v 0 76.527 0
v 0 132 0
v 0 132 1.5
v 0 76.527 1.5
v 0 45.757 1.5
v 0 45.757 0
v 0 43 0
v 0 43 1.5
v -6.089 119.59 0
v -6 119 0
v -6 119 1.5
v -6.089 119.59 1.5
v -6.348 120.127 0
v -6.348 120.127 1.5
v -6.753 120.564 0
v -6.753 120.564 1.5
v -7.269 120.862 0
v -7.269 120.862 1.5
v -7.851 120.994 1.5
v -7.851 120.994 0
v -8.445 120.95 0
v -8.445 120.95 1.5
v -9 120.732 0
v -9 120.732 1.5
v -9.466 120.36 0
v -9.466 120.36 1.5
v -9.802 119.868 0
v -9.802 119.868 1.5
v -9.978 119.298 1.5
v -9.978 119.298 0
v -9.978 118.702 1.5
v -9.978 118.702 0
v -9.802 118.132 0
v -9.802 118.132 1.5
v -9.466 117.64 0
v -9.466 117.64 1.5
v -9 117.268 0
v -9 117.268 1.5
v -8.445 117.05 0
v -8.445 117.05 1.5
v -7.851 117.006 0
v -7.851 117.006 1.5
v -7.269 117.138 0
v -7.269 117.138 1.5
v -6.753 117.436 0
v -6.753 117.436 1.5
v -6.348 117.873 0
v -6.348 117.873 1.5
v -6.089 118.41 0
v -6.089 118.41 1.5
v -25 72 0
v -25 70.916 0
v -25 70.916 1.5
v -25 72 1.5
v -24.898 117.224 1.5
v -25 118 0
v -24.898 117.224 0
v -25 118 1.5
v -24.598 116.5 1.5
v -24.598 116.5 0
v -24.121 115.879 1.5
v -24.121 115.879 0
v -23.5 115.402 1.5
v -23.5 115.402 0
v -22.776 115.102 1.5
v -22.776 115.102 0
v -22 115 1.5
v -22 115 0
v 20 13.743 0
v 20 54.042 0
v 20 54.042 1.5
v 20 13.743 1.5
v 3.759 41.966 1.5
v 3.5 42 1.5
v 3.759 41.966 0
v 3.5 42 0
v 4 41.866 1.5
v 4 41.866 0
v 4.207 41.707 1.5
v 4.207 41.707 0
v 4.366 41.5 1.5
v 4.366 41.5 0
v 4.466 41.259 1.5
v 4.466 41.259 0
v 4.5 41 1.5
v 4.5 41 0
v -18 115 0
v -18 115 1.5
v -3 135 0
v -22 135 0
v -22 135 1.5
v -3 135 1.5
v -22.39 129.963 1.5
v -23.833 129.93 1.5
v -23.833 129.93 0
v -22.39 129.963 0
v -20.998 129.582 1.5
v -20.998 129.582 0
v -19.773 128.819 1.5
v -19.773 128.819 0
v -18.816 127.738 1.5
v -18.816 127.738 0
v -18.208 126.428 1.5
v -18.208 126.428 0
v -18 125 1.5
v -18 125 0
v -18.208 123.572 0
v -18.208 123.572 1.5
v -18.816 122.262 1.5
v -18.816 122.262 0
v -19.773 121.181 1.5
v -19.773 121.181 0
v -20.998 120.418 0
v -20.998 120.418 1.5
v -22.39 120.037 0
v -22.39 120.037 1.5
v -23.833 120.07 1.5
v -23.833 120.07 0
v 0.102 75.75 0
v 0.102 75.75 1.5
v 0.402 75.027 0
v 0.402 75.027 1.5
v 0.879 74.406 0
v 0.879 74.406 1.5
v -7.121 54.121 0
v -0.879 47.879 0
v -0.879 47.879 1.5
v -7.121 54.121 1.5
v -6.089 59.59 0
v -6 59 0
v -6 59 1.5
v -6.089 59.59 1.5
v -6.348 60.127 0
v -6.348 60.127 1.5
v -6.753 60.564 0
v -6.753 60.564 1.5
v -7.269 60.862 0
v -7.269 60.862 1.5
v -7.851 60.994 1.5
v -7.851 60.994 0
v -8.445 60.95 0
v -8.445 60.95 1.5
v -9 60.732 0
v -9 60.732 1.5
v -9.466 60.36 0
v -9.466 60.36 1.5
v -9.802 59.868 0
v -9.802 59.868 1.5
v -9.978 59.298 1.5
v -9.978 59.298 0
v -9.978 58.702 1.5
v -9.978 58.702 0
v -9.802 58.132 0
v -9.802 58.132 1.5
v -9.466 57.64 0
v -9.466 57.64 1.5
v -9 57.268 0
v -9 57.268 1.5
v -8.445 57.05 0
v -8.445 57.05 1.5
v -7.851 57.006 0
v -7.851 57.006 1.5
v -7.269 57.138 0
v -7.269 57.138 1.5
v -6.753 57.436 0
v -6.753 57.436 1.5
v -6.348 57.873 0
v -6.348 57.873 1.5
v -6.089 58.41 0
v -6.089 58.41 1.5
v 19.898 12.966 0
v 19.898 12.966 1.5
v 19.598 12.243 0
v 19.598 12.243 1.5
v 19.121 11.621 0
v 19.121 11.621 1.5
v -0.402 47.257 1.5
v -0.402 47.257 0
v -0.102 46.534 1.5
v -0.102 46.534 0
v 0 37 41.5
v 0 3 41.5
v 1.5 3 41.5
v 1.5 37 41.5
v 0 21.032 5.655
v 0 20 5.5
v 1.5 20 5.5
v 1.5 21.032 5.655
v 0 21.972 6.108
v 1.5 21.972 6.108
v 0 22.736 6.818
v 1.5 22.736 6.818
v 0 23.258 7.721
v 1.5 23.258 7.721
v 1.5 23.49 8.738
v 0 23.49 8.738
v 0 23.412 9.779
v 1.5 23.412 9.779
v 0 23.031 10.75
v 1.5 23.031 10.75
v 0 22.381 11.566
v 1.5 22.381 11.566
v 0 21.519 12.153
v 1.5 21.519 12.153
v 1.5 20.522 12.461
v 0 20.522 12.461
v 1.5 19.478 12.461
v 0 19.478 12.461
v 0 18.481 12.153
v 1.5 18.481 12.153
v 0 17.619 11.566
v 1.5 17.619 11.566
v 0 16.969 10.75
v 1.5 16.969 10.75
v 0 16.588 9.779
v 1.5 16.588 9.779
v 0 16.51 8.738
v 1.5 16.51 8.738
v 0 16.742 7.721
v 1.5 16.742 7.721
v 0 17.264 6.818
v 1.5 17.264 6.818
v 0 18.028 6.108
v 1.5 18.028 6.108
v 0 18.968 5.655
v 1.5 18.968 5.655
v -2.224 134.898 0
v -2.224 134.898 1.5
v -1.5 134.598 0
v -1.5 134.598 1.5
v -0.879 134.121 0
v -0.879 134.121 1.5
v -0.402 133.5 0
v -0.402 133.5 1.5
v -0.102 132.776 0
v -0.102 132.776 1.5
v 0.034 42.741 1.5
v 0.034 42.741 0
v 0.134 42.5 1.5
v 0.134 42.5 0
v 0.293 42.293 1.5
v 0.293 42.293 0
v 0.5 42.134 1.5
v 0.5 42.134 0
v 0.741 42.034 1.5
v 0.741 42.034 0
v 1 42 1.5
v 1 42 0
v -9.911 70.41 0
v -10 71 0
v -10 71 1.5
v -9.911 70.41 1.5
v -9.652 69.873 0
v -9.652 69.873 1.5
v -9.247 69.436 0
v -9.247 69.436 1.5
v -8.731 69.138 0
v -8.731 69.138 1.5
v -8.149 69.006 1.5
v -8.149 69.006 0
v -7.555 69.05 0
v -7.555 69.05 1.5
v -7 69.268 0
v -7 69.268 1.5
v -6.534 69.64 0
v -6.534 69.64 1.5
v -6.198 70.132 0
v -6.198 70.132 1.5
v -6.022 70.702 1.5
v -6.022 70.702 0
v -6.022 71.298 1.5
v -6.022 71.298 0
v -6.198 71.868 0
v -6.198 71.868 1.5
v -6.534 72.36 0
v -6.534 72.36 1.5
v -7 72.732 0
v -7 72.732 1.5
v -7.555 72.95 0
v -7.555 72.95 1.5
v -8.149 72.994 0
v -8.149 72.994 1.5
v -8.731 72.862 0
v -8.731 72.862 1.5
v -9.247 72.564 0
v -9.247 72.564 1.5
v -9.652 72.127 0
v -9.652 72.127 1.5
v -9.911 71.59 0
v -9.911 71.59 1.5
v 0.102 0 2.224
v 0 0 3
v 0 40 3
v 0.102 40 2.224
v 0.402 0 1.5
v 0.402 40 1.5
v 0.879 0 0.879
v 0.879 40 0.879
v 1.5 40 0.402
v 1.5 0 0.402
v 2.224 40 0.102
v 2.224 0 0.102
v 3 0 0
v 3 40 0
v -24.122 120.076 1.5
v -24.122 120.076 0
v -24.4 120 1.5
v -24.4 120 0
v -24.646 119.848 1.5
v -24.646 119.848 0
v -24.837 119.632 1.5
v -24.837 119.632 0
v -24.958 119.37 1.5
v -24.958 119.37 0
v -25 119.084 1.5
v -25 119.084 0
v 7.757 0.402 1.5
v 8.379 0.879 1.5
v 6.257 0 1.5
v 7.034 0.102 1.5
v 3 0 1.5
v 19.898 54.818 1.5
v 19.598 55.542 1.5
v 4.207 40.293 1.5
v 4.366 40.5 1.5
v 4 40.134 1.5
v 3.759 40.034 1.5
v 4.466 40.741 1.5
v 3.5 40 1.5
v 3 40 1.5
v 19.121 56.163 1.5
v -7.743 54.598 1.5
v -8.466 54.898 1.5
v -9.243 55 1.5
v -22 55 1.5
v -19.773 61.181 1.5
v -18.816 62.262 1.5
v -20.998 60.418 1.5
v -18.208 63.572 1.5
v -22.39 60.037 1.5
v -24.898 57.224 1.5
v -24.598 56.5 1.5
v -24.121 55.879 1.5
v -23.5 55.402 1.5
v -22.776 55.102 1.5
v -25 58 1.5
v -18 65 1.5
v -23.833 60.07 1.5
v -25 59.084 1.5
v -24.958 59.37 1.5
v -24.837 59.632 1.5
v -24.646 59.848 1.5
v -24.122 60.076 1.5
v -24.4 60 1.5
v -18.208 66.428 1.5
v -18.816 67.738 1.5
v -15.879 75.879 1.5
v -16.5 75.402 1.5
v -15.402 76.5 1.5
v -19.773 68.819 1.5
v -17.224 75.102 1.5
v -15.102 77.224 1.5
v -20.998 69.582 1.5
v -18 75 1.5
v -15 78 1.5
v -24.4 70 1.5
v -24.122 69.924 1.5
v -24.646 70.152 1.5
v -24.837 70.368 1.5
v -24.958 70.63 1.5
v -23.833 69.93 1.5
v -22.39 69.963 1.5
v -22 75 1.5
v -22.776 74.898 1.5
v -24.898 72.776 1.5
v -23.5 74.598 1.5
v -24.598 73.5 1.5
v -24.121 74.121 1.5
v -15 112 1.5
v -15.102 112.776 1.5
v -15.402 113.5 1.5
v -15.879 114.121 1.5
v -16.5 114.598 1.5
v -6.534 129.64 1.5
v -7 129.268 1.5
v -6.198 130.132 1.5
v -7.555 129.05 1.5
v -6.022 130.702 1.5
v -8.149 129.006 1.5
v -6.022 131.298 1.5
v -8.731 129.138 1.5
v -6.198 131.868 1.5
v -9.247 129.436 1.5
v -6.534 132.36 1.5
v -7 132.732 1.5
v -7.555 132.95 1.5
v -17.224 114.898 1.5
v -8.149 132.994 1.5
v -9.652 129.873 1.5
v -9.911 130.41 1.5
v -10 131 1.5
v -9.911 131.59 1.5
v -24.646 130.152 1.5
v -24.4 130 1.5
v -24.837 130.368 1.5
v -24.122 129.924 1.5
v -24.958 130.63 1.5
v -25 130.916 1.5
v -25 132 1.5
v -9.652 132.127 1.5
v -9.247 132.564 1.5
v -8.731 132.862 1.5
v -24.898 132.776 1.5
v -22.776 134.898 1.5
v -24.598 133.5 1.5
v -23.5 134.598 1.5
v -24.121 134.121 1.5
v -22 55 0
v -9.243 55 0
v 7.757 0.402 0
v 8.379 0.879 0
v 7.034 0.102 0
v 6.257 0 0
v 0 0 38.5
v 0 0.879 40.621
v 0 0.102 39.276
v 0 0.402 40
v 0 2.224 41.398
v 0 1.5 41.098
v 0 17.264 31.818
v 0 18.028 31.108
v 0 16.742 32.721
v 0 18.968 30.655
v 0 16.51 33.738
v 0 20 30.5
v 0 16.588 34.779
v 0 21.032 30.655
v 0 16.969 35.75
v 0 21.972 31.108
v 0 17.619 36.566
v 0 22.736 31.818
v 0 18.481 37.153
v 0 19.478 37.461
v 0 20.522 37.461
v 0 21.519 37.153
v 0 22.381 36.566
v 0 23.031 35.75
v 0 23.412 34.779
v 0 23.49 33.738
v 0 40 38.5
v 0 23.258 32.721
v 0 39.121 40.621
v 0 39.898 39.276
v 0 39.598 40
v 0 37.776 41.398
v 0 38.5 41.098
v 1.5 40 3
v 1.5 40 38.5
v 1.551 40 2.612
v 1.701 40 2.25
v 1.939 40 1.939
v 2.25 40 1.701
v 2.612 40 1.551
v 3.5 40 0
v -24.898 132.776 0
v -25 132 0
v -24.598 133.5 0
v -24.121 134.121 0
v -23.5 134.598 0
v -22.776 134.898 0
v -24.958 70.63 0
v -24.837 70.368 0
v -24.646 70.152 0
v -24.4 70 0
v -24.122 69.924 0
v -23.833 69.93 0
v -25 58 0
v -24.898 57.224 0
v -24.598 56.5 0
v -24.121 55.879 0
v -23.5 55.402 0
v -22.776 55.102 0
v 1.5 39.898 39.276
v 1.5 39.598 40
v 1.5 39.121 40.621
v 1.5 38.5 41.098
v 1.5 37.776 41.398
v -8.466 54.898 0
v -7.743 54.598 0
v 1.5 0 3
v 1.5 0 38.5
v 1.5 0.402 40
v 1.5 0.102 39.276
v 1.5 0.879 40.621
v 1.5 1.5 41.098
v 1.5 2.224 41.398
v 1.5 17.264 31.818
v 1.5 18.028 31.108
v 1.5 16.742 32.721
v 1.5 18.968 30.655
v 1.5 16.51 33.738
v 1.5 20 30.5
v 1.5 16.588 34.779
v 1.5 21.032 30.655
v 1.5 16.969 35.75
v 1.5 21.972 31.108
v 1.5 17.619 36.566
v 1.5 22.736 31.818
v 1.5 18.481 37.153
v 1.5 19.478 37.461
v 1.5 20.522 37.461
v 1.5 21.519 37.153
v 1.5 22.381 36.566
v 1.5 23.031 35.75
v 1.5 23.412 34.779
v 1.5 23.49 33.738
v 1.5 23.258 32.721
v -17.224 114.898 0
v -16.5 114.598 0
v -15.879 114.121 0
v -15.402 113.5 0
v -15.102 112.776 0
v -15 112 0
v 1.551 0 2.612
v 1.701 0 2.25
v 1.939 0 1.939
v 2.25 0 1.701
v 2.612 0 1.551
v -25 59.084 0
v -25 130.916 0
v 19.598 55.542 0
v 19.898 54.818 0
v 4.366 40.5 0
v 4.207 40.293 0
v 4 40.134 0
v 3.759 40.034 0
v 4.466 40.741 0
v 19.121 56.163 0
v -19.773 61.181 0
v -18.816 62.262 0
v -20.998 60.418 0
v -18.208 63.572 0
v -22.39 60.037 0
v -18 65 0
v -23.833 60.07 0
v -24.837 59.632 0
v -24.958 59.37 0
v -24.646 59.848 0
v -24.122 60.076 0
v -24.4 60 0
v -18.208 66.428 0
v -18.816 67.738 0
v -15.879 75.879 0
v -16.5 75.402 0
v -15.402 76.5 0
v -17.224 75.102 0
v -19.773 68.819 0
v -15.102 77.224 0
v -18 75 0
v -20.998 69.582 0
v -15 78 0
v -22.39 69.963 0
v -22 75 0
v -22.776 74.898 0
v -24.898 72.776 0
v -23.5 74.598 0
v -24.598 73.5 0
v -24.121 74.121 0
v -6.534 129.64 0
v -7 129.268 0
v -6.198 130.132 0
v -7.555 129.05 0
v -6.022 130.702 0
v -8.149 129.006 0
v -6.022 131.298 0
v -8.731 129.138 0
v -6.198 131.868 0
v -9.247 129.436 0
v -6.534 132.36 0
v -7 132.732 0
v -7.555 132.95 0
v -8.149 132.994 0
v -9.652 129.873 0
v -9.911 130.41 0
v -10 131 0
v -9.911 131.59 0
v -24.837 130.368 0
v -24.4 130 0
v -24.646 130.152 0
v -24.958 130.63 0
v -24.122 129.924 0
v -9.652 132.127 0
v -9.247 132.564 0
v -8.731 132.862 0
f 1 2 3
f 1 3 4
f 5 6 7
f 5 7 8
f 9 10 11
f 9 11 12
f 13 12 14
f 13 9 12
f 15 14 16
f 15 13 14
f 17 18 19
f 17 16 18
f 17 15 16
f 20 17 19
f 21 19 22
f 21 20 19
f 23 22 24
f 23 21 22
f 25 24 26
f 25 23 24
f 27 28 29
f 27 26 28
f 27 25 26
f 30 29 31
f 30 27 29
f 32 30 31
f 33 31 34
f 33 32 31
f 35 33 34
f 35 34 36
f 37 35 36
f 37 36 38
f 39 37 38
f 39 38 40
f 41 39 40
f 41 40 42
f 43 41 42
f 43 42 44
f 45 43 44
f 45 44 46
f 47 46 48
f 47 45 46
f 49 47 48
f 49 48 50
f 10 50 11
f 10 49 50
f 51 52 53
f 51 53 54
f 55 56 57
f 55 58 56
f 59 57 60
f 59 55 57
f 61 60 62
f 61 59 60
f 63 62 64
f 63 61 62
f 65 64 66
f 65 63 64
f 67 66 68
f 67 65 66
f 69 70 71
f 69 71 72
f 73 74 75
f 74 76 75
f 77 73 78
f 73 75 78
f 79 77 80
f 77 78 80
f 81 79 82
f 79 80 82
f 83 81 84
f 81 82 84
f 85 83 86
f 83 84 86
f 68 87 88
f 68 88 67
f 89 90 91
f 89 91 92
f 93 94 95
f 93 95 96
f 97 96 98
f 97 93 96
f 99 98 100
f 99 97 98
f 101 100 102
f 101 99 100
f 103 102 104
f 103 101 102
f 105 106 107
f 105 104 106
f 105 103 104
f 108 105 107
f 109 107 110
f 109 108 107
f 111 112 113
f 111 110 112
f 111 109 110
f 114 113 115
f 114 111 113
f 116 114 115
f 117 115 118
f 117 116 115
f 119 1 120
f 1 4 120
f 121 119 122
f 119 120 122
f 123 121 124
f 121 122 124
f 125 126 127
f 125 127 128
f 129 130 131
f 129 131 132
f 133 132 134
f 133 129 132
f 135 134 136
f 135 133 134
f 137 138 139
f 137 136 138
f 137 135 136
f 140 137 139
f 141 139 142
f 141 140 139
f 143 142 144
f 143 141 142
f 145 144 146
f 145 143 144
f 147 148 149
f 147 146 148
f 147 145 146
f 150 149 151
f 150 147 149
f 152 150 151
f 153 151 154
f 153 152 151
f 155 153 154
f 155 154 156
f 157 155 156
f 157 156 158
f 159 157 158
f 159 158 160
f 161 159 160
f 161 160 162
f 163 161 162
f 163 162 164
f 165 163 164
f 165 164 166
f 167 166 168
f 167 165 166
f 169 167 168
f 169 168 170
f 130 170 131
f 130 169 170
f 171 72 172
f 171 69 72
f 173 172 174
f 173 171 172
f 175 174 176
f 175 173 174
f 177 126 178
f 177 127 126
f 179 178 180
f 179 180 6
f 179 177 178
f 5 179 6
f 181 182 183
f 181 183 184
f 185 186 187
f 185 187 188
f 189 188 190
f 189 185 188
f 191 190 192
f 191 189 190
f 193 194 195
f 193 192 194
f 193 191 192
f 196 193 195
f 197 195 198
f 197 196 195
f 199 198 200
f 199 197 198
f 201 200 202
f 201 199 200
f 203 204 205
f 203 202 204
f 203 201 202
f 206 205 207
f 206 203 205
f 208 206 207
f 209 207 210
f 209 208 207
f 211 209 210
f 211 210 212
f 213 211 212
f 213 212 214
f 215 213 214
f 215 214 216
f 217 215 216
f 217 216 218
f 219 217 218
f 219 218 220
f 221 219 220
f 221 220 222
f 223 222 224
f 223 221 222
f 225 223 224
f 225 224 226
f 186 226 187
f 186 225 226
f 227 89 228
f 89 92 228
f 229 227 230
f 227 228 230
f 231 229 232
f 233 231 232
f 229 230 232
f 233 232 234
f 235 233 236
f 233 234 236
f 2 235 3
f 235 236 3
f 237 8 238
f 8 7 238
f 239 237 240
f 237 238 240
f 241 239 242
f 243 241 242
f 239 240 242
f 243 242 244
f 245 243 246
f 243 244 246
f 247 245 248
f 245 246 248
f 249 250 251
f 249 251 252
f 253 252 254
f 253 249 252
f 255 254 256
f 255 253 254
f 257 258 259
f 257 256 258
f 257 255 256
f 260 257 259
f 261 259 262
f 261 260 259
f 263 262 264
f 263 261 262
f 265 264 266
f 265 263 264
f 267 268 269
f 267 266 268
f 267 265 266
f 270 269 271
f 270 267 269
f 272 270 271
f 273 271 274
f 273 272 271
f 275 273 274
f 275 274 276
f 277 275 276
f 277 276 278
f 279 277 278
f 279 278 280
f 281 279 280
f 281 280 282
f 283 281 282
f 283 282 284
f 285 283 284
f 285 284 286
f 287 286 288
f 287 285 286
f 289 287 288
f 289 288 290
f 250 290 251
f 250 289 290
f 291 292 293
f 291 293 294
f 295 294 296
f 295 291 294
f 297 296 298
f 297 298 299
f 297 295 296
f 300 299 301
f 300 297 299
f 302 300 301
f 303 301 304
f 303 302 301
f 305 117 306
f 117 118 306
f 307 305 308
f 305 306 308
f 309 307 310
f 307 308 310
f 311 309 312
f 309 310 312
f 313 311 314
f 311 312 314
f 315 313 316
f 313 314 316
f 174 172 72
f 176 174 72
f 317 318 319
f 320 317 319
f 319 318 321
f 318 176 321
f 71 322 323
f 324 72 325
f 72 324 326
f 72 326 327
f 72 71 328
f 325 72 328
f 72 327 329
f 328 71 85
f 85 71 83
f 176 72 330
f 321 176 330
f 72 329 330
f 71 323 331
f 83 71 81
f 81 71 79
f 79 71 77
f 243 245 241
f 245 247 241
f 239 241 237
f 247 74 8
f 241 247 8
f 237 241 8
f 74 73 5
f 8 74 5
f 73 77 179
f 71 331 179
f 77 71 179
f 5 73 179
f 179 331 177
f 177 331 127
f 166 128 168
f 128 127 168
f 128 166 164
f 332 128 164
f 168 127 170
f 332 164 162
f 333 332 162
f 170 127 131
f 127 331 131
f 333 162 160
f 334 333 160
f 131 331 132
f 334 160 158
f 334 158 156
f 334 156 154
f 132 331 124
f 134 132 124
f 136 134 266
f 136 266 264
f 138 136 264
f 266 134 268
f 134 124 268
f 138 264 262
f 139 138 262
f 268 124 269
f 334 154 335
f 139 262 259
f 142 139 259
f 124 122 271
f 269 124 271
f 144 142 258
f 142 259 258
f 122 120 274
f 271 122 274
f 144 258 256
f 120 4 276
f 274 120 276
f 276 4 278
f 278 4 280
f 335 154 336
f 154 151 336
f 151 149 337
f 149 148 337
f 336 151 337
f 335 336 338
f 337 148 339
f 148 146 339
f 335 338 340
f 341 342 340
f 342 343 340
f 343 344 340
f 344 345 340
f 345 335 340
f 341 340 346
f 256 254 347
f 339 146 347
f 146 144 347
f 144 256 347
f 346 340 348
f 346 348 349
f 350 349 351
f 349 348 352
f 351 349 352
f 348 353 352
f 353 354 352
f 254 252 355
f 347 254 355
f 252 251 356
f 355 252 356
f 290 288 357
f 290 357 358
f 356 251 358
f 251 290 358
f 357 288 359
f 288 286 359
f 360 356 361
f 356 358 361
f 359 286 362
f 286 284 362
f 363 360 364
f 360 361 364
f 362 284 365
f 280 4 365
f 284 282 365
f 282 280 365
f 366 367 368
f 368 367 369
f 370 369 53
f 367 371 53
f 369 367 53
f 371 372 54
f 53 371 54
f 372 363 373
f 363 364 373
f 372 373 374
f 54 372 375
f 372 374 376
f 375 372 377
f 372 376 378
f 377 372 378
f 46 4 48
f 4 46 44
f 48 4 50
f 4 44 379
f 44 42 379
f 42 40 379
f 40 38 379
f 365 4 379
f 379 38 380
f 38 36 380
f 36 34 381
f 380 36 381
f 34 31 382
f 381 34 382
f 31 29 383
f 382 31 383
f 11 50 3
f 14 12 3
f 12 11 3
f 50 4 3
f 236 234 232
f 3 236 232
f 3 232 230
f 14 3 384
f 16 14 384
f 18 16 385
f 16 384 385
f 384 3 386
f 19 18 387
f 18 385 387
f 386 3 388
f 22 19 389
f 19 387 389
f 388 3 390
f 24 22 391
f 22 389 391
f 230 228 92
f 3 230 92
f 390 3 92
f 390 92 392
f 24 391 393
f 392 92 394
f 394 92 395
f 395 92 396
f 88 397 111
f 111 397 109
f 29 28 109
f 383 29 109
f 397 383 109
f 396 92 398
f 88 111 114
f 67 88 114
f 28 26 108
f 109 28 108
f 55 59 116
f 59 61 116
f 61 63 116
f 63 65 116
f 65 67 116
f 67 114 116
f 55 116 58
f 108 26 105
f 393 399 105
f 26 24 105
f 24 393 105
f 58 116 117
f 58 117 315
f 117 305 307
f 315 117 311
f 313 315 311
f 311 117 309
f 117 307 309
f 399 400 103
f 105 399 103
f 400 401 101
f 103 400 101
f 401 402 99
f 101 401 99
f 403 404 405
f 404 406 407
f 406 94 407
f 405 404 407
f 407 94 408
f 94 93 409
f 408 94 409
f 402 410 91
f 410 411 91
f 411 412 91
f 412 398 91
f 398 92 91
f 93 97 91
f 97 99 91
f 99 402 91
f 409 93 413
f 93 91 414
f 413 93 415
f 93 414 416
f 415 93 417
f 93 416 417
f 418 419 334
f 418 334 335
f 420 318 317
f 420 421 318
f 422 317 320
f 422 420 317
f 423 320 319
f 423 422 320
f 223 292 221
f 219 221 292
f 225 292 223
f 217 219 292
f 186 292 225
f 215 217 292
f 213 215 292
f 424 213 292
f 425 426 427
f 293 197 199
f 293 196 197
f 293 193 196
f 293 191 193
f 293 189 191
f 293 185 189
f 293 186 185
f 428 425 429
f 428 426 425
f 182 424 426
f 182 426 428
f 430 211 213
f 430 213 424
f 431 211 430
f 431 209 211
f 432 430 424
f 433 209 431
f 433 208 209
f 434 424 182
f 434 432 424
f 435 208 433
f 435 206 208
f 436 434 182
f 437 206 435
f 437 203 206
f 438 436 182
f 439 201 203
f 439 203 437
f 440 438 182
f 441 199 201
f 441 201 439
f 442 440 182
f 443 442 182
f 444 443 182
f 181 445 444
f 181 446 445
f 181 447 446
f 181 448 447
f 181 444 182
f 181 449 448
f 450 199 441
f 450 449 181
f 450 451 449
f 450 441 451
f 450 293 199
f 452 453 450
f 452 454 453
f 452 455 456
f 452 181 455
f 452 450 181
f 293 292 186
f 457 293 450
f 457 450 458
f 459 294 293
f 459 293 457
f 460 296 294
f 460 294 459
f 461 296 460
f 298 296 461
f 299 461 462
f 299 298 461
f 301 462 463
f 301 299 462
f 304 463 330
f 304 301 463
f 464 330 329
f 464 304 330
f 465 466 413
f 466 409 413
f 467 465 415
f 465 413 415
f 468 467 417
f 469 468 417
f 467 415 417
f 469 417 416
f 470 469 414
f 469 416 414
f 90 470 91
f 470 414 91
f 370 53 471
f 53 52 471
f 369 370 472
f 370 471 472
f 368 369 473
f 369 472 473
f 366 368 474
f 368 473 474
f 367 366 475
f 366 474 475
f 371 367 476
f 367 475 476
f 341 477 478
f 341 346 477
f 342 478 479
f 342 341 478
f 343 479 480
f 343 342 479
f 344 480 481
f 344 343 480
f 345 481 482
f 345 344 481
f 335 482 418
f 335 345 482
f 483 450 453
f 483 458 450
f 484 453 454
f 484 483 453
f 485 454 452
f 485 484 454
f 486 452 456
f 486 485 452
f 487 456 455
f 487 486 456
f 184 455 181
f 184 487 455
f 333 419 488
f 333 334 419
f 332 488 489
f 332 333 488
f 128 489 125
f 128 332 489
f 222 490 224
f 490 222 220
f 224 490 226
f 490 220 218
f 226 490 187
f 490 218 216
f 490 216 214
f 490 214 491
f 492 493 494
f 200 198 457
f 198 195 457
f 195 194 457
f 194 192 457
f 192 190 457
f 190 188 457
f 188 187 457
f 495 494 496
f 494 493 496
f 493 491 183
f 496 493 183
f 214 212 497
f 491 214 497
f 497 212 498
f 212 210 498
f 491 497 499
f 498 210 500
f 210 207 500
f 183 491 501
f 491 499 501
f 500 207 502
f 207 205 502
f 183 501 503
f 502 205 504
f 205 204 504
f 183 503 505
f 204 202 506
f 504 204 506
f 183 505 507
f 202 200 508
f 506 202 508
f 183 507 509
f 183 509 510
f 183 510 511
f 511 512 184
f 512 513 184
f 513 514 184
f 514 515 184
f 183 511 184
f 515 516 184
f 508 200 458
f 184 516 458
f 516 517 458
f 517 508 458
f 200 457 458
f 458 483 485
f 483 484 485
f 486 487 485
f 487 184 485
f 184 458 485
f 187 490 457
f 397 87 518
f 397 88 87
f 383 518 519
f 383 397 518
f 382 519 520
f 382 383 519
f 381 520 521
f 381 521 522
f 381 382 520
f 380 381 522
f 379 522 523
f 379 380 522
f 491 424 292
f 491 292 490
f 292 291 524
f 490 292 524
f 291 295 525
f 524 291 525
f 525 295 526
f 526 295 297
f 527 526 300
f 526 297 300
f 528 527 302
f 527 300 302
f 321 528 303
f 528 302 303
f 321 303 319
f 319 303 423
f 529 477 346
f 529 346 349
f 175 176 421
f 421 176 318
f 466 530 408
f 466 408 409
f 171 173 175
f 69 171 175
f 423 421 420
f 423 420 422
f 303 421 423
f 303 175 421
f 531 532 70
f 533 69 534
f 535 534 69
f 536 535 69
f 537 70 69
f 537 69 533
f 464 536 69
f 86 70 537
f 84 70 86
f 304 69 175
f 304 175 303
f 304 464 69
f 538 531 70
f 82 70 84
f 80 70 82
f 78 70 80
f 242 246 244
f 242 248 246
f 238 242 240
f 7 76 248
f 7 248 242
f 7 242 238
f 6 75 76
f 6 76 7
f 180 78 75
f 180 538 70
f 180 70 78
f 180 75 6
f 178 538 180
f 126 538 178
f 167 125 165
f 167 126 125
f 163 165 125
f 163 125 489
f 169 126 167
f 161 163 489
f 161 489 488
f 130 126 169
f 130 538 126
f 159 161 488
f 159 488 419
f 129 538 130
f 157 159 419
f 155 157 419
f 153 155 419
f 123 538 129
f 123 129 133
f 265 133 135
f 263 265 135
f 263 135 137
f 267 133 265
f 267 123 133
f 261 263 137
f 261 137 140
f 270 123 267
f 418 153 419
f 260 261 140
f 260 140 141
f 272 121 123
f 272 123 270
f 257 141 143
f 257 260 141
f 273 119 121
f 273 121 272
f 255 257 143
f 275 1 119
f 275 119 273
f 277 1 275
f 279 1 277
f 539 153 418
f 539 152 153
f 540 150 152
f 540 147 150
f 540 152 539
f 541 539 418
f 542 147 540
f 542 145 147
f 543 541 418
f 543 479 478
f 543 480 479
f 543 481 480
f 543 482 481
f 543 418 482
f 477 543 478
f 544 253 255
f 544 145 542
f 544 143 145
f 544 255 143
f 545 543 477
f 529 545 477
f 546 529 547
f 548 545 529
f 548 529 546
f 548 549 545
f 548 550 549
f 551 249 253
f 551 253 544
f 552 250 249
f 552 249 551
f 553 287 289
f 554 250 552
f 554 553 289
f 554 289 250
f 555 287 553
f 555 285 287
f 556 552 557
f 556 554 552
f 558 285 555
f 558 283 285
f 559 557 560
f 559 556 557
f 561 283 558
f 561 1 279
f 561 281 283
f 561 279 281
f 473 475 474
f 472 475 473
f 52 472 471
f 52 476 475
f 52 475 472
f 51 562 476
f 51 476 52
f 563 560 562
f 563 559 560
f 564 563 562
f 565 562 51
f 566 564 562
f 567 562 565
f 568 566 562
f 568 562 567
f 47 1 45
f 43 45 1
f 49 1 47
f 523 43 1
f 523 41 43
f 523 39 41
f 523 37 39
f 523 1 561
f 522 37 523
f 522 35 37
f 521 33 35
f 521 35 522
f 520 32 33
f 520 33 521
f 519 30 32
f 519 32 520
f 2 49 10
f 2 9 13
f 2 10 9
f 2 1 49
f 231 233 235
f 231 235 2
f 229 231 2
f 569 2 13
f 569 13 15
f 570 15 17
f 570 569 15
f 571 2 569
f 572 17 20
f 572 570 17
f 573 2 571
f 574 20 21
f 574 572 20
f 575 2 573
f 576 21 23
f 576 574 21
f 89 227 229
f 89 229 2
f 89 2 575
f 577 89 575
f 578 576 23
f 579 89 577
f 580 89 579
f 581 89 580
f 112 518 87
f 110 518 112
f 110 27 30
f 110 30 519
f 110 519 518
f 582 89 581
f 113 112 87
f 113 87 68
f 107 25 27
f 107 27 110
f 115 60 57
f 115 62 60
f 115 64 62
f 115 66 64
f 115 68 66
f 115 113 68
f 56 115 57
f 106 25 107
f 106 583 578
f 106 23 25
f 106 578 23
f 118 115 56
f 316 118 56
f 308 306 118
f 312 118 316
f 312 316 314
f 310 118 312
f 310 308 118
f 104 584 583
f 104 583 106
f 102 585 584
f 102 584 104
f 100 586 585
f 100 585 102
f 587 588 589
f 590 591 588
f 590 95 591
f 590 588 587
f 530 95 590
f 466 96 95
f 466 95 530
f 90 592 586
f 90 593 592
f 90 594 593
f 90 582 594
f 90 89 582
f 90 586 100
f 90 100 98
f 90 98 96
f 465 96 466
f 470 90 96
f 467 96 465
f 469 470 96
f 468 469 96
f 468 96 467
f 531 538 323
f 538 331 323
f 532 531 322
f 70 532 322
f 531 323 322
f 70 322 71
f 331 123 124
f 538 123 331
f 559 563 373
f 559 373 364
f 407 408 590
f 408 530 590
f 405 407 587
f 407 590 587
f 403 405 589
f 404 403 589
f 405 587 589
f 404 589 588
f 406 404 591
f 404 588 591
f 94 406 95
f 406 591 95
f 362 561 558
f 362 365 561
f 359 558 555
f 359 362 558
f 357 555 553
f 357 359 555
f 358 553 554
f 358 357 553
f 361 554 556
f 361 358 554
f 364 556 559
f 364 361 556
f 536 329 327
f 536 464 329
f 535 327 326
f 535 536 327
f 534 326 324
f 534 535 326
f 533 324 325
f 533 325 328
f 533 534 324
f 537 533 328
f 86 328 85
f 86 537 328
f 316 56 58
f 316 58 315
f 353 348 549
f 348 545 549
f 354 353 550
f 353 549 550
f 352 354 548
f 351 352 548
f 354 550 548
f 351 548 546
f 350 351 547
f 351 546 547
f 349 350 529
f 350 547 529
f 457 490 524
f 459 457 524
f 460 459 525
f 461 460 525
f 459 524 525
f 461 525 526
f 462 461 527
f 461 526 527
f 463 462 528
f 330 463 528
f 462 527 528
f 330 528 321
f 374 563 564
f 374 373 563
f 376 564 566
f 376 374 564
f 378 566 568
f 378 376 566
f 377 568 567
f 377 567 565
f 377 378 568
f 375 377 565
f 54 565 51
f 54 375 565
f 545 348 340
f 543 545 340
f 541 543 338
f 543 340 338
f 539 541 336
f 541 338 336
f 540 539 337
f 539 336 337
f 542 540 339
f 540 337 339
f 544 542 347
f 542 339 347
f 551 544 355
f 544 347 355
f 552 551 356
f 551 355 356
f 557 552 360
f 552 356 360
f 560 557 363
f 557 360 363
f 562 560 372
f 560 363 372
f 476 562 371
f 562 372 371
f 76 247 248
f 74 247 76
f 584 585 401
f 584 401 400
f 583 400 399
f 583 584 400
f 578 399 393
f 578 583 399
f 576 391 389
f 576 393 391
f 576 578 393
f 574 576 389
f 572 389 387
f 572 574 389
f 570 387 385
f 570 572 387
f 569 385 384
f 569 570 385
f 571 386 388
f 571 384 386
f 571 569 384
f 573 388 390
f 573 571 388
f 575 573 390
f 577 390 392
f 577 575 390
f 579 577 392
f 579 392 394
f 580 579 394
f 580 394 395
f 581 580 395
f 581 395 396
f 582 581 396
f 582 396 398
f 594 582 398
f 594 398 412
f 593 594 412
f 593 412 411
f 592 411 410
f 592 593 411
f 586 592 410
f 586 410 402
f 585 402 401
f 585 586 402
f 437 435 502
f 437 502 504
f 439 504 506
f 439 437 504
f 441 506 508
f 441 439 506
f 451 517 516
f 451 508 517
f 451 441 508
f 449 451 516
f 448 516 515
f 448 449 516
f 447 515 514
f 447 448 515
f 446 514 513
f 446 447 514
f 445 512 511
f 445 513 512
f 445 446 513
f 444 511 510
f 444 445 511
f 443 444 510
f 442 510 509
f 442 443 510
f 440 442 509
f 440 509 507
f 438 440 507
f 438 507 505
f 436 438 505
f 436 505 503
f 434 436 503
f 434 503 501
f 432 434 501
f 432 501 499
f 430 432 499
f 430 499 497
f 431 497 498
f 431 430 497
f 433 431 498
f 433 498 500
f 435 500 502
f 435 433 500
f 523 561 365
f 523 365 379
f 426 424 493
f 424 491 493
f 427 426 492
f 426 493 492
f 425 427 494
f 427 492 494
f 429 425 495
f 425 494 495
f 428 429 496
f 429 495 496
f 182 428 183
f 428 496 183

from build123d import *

# Parameters (mm, degrees)
BOSS_EXTRU_1_DEPTH           = 1.5
ENL_V_MAT_EXTRU_1_DEPTH      = 138.30349595
ESQUISSE3_W                  = 40
ESQUISSE3_H                  = 40
BOSS_EXTRU_2_DEPTH           = 1.5
ESQUISSE4_W                  = 4.5
ESQUISSE4_H                  = 2
ENL_V_MAT_EXTRU_2_DEPTH      = 1.5
ENL_V_MAT_EXTRU_5_DEPTH      = 144.003496461
CONG_1_R                     = 1
CONG_2_R                     = 3
ENL_V_MAT_EXTRU_3_DEPTH      = 144.699338899
ENL_V_MAT_EXTRU_3_DEPTH_BACK = 144.699338899
ESQUISSE9_R                  = 3.5
ENL_V_MAT_EXTRU_4_DEPTH      = 144.003496461
ENL_V_MAT_EXTRU_4_DEPTH_BACK = 144.003496461
ESQUISSE10_R                 = 2
CONVERTIR_VOLUME1_DEPTH      = 40
CONVERTIR_VOLUME1_2_DEPTH    = 40


# Read off the part's stored shape, not the designer's step: Convertir-Volume1
with BuildPart() as part:
    # Esquisse1 → Boss.-Extru.1 (new body)
    with BuildSketch(Plane.XY):
        Polygon((0, 0), (0, 47), (-8, 55), (-25, 55), (-25, 75), (-15, 75), (-15, 115), (-25, 115), (-25, 135), (0, 135), (0, 75.284271247), (20, 55.284271247), (20, 0), align=None)
    extrude(amount=BOSS_EXTRU_1_DEPTH)

    # Esquisse2 → Enlèv. mat.-Extru.1 (cut, through all)
    with BuildSketch(Plane.XY.offset(1.5)):
        with BuildLine():
            Line((-25, 69.582575695), (-25, 60.417424305))
            ThreePointArc((-25, 60.417424305), (-18, 65), (-25, 69.582575695))
        make_face()
        with BuildLine():
            Line((-25, 120.417424305), (-25, 129.582575695))
            ThreePointArc((-25, 129.582575695), (-18, 125), (-25, 120.417424305))
        make_face()
    extrude(amount=-ENL_V_MAT_EXTRU_1_DEPTH, mode=Mode.SUBTRACT)

    # Esquisse3 → Boss.-Extru.2 (add)
    with BuildSketch(Plane.ZY):
        with Locations((21.5, 20)):
            Rectangle(ESQUISSE3_W, ESQUISSE3_H)
    extrude(amount=-BOSS_EXTRU_2_DEPTH)

    # Esquisse4 → Enlèv. mat.-Extru.2 (cut)
    with BuildSketch(Plane.XY.offset(1.5)):
        with Locations((2.25, 41)):
            Rectangle(ESQUISSE4_W, ESQUISSE4_H)
    extrude(amount=-ENL_V_MAT_EXTRU_2_DEPTH, mode=Mode.SUBTRACT)

    # Esquisse11 → Enlèv. mat.-Extru.5 (cut, through all)
    with BuildSketch(Plane.XY.offset(1.5)):
        Polygon((20, 12.5), (7.5, 0), (20, 0), align=None)
    extrude(amount=-ENL_V_MAT_EXTRU_5_DEPTH, mode=Mode.SUBTRACT)

    # Congé1
    cong_1_edges = [part.edges().sort_by_distance(p)[0] for p in [
        (-25, 129.582575695, 0.75),
        (-25, 120.417424305, 0.75),
        (-25, 69.582575695, 0.75),
        (-25, 60.417424305, 0.75),
        (0, 42, 0.75),
        (4.5, 42, 0.75),
        (4.5, 40, 0.75),
    ]]
    fillet(cong_1_edges, radius=CONG_1_R - 0.0001)  # a hair under: the kernel refuses the full size

    # Congé2
    cong_2_edges = [part.edges().sort_by_distance(p)[0] for p in [
        (0, 47, 0.75),
        (-8, 55, 0.75),
        (-25, 55, 0.75),
        (-25, 75, 0.75),
        (-15, 75, 0.75),
        (-15, 115, 0.75),
        (-25, 115, 0.75),
        (-25, 135, 0.75),
        (0, 135, 0.75),
        (0, 75.284271247, 0.75),
        (20, 55.284271247, 0.75),
        (0.75, 40, 41.5),
        (0.75, 0, 41.5),
        (20, 12.5, 0.75),
        (7.5, 0, 0.75),
    ]]
    fillet(cong_2_edges, radius=CONG_2_R)

    # Esquisse9 → Enlèv. mat.-Extru.3 (cut, two sides: drawn at the far end of the back side and taken through both)
    with BuildSketch(Plane(origin=(1.5, 0, 0), x_dir=(0, 0, -1), z_dir=(1, 0, 0)).offset(-ENL_V_MAT_EXTRU_3_DEPTH_BACK)):
        with Locations((-34, 20)):
            Circle(ESQUISSE9_R)
        with Locations((-9, 20)):
            Circle(ESQUISSE9_R)
    extrude(amount=ENL_V_MAT_EXTRU_3_DEPTH + ENL_V_MAT_EXTRU_3_DEPTH_BACK, mode=Mode.SUBTRACT)

    # Esquisse10 → Enlèv. mat.-Extru.4 (cut, two sides: drawn at the far end of the back side and taken through both)
    with BuildSketch(Plane.XY.offset(1.5).offset(-ENL_V_MAT_EXTRU_4_DEPTH_BACK)):
        with Locations((-8, 59)):
            Circle(ESQUISSE10_R)
        with Locations(Location((-8, 71, 0), (0, 0, 180))):
            Circle(ESQUISSE10_R)
        with Locations((-8, 119)):
            Circle(ESQUISSE10_R)
        with Locations(Location((-8, 131, 0), (0, 0, 180))):
            Circle(ESQUISSE10_R)
    extrude(amount=ENL_V_MAT_EXTRU_4_DEPTH + ENL_V_MAT_EXTRU_4_DEPTH_BACK, mode=Mode.SUBTRACT)

    # Convertir-Volume1 outline → Convertir-Volume1 (cut)
    with BuildSketch(Plane(origin=(0, 0, 0), x_dir=(1, 0, 0), z_dir=(0, 1, 0))):
        with BuildLine():
            ThreePointArc((0, -3), (0.878679656, -0.878679656), (3, 0))
            Line((3, 0), (0, 0))
            Line((0, 0), (0, -3))
        make_face()
    extrude(amount=CONVERTIR_VOLUME1_DEPTH, mode=Mode.SUBTRACT)

    # Convertir-Volume1 2 outline → Convertir-Volume1 2 (add)
    with BuildSketch(Plane(origin=(0, 0, 0), x_dir=(1, 0, 0), z_dir=(0, 1, 0))):
        with BuildLine():
            Line((1.5, -1.5), (1.5, -3))
            ThreePointArc((1.5, -3), (1.939339828, -1.939339828), (3, -1.5))
            Line((3, -1.5), (1.5, -1.5))
        make_face()
    extrude(amount=CONVERTIR_VOLUME1_2_DEPTH)


solid = part.part
